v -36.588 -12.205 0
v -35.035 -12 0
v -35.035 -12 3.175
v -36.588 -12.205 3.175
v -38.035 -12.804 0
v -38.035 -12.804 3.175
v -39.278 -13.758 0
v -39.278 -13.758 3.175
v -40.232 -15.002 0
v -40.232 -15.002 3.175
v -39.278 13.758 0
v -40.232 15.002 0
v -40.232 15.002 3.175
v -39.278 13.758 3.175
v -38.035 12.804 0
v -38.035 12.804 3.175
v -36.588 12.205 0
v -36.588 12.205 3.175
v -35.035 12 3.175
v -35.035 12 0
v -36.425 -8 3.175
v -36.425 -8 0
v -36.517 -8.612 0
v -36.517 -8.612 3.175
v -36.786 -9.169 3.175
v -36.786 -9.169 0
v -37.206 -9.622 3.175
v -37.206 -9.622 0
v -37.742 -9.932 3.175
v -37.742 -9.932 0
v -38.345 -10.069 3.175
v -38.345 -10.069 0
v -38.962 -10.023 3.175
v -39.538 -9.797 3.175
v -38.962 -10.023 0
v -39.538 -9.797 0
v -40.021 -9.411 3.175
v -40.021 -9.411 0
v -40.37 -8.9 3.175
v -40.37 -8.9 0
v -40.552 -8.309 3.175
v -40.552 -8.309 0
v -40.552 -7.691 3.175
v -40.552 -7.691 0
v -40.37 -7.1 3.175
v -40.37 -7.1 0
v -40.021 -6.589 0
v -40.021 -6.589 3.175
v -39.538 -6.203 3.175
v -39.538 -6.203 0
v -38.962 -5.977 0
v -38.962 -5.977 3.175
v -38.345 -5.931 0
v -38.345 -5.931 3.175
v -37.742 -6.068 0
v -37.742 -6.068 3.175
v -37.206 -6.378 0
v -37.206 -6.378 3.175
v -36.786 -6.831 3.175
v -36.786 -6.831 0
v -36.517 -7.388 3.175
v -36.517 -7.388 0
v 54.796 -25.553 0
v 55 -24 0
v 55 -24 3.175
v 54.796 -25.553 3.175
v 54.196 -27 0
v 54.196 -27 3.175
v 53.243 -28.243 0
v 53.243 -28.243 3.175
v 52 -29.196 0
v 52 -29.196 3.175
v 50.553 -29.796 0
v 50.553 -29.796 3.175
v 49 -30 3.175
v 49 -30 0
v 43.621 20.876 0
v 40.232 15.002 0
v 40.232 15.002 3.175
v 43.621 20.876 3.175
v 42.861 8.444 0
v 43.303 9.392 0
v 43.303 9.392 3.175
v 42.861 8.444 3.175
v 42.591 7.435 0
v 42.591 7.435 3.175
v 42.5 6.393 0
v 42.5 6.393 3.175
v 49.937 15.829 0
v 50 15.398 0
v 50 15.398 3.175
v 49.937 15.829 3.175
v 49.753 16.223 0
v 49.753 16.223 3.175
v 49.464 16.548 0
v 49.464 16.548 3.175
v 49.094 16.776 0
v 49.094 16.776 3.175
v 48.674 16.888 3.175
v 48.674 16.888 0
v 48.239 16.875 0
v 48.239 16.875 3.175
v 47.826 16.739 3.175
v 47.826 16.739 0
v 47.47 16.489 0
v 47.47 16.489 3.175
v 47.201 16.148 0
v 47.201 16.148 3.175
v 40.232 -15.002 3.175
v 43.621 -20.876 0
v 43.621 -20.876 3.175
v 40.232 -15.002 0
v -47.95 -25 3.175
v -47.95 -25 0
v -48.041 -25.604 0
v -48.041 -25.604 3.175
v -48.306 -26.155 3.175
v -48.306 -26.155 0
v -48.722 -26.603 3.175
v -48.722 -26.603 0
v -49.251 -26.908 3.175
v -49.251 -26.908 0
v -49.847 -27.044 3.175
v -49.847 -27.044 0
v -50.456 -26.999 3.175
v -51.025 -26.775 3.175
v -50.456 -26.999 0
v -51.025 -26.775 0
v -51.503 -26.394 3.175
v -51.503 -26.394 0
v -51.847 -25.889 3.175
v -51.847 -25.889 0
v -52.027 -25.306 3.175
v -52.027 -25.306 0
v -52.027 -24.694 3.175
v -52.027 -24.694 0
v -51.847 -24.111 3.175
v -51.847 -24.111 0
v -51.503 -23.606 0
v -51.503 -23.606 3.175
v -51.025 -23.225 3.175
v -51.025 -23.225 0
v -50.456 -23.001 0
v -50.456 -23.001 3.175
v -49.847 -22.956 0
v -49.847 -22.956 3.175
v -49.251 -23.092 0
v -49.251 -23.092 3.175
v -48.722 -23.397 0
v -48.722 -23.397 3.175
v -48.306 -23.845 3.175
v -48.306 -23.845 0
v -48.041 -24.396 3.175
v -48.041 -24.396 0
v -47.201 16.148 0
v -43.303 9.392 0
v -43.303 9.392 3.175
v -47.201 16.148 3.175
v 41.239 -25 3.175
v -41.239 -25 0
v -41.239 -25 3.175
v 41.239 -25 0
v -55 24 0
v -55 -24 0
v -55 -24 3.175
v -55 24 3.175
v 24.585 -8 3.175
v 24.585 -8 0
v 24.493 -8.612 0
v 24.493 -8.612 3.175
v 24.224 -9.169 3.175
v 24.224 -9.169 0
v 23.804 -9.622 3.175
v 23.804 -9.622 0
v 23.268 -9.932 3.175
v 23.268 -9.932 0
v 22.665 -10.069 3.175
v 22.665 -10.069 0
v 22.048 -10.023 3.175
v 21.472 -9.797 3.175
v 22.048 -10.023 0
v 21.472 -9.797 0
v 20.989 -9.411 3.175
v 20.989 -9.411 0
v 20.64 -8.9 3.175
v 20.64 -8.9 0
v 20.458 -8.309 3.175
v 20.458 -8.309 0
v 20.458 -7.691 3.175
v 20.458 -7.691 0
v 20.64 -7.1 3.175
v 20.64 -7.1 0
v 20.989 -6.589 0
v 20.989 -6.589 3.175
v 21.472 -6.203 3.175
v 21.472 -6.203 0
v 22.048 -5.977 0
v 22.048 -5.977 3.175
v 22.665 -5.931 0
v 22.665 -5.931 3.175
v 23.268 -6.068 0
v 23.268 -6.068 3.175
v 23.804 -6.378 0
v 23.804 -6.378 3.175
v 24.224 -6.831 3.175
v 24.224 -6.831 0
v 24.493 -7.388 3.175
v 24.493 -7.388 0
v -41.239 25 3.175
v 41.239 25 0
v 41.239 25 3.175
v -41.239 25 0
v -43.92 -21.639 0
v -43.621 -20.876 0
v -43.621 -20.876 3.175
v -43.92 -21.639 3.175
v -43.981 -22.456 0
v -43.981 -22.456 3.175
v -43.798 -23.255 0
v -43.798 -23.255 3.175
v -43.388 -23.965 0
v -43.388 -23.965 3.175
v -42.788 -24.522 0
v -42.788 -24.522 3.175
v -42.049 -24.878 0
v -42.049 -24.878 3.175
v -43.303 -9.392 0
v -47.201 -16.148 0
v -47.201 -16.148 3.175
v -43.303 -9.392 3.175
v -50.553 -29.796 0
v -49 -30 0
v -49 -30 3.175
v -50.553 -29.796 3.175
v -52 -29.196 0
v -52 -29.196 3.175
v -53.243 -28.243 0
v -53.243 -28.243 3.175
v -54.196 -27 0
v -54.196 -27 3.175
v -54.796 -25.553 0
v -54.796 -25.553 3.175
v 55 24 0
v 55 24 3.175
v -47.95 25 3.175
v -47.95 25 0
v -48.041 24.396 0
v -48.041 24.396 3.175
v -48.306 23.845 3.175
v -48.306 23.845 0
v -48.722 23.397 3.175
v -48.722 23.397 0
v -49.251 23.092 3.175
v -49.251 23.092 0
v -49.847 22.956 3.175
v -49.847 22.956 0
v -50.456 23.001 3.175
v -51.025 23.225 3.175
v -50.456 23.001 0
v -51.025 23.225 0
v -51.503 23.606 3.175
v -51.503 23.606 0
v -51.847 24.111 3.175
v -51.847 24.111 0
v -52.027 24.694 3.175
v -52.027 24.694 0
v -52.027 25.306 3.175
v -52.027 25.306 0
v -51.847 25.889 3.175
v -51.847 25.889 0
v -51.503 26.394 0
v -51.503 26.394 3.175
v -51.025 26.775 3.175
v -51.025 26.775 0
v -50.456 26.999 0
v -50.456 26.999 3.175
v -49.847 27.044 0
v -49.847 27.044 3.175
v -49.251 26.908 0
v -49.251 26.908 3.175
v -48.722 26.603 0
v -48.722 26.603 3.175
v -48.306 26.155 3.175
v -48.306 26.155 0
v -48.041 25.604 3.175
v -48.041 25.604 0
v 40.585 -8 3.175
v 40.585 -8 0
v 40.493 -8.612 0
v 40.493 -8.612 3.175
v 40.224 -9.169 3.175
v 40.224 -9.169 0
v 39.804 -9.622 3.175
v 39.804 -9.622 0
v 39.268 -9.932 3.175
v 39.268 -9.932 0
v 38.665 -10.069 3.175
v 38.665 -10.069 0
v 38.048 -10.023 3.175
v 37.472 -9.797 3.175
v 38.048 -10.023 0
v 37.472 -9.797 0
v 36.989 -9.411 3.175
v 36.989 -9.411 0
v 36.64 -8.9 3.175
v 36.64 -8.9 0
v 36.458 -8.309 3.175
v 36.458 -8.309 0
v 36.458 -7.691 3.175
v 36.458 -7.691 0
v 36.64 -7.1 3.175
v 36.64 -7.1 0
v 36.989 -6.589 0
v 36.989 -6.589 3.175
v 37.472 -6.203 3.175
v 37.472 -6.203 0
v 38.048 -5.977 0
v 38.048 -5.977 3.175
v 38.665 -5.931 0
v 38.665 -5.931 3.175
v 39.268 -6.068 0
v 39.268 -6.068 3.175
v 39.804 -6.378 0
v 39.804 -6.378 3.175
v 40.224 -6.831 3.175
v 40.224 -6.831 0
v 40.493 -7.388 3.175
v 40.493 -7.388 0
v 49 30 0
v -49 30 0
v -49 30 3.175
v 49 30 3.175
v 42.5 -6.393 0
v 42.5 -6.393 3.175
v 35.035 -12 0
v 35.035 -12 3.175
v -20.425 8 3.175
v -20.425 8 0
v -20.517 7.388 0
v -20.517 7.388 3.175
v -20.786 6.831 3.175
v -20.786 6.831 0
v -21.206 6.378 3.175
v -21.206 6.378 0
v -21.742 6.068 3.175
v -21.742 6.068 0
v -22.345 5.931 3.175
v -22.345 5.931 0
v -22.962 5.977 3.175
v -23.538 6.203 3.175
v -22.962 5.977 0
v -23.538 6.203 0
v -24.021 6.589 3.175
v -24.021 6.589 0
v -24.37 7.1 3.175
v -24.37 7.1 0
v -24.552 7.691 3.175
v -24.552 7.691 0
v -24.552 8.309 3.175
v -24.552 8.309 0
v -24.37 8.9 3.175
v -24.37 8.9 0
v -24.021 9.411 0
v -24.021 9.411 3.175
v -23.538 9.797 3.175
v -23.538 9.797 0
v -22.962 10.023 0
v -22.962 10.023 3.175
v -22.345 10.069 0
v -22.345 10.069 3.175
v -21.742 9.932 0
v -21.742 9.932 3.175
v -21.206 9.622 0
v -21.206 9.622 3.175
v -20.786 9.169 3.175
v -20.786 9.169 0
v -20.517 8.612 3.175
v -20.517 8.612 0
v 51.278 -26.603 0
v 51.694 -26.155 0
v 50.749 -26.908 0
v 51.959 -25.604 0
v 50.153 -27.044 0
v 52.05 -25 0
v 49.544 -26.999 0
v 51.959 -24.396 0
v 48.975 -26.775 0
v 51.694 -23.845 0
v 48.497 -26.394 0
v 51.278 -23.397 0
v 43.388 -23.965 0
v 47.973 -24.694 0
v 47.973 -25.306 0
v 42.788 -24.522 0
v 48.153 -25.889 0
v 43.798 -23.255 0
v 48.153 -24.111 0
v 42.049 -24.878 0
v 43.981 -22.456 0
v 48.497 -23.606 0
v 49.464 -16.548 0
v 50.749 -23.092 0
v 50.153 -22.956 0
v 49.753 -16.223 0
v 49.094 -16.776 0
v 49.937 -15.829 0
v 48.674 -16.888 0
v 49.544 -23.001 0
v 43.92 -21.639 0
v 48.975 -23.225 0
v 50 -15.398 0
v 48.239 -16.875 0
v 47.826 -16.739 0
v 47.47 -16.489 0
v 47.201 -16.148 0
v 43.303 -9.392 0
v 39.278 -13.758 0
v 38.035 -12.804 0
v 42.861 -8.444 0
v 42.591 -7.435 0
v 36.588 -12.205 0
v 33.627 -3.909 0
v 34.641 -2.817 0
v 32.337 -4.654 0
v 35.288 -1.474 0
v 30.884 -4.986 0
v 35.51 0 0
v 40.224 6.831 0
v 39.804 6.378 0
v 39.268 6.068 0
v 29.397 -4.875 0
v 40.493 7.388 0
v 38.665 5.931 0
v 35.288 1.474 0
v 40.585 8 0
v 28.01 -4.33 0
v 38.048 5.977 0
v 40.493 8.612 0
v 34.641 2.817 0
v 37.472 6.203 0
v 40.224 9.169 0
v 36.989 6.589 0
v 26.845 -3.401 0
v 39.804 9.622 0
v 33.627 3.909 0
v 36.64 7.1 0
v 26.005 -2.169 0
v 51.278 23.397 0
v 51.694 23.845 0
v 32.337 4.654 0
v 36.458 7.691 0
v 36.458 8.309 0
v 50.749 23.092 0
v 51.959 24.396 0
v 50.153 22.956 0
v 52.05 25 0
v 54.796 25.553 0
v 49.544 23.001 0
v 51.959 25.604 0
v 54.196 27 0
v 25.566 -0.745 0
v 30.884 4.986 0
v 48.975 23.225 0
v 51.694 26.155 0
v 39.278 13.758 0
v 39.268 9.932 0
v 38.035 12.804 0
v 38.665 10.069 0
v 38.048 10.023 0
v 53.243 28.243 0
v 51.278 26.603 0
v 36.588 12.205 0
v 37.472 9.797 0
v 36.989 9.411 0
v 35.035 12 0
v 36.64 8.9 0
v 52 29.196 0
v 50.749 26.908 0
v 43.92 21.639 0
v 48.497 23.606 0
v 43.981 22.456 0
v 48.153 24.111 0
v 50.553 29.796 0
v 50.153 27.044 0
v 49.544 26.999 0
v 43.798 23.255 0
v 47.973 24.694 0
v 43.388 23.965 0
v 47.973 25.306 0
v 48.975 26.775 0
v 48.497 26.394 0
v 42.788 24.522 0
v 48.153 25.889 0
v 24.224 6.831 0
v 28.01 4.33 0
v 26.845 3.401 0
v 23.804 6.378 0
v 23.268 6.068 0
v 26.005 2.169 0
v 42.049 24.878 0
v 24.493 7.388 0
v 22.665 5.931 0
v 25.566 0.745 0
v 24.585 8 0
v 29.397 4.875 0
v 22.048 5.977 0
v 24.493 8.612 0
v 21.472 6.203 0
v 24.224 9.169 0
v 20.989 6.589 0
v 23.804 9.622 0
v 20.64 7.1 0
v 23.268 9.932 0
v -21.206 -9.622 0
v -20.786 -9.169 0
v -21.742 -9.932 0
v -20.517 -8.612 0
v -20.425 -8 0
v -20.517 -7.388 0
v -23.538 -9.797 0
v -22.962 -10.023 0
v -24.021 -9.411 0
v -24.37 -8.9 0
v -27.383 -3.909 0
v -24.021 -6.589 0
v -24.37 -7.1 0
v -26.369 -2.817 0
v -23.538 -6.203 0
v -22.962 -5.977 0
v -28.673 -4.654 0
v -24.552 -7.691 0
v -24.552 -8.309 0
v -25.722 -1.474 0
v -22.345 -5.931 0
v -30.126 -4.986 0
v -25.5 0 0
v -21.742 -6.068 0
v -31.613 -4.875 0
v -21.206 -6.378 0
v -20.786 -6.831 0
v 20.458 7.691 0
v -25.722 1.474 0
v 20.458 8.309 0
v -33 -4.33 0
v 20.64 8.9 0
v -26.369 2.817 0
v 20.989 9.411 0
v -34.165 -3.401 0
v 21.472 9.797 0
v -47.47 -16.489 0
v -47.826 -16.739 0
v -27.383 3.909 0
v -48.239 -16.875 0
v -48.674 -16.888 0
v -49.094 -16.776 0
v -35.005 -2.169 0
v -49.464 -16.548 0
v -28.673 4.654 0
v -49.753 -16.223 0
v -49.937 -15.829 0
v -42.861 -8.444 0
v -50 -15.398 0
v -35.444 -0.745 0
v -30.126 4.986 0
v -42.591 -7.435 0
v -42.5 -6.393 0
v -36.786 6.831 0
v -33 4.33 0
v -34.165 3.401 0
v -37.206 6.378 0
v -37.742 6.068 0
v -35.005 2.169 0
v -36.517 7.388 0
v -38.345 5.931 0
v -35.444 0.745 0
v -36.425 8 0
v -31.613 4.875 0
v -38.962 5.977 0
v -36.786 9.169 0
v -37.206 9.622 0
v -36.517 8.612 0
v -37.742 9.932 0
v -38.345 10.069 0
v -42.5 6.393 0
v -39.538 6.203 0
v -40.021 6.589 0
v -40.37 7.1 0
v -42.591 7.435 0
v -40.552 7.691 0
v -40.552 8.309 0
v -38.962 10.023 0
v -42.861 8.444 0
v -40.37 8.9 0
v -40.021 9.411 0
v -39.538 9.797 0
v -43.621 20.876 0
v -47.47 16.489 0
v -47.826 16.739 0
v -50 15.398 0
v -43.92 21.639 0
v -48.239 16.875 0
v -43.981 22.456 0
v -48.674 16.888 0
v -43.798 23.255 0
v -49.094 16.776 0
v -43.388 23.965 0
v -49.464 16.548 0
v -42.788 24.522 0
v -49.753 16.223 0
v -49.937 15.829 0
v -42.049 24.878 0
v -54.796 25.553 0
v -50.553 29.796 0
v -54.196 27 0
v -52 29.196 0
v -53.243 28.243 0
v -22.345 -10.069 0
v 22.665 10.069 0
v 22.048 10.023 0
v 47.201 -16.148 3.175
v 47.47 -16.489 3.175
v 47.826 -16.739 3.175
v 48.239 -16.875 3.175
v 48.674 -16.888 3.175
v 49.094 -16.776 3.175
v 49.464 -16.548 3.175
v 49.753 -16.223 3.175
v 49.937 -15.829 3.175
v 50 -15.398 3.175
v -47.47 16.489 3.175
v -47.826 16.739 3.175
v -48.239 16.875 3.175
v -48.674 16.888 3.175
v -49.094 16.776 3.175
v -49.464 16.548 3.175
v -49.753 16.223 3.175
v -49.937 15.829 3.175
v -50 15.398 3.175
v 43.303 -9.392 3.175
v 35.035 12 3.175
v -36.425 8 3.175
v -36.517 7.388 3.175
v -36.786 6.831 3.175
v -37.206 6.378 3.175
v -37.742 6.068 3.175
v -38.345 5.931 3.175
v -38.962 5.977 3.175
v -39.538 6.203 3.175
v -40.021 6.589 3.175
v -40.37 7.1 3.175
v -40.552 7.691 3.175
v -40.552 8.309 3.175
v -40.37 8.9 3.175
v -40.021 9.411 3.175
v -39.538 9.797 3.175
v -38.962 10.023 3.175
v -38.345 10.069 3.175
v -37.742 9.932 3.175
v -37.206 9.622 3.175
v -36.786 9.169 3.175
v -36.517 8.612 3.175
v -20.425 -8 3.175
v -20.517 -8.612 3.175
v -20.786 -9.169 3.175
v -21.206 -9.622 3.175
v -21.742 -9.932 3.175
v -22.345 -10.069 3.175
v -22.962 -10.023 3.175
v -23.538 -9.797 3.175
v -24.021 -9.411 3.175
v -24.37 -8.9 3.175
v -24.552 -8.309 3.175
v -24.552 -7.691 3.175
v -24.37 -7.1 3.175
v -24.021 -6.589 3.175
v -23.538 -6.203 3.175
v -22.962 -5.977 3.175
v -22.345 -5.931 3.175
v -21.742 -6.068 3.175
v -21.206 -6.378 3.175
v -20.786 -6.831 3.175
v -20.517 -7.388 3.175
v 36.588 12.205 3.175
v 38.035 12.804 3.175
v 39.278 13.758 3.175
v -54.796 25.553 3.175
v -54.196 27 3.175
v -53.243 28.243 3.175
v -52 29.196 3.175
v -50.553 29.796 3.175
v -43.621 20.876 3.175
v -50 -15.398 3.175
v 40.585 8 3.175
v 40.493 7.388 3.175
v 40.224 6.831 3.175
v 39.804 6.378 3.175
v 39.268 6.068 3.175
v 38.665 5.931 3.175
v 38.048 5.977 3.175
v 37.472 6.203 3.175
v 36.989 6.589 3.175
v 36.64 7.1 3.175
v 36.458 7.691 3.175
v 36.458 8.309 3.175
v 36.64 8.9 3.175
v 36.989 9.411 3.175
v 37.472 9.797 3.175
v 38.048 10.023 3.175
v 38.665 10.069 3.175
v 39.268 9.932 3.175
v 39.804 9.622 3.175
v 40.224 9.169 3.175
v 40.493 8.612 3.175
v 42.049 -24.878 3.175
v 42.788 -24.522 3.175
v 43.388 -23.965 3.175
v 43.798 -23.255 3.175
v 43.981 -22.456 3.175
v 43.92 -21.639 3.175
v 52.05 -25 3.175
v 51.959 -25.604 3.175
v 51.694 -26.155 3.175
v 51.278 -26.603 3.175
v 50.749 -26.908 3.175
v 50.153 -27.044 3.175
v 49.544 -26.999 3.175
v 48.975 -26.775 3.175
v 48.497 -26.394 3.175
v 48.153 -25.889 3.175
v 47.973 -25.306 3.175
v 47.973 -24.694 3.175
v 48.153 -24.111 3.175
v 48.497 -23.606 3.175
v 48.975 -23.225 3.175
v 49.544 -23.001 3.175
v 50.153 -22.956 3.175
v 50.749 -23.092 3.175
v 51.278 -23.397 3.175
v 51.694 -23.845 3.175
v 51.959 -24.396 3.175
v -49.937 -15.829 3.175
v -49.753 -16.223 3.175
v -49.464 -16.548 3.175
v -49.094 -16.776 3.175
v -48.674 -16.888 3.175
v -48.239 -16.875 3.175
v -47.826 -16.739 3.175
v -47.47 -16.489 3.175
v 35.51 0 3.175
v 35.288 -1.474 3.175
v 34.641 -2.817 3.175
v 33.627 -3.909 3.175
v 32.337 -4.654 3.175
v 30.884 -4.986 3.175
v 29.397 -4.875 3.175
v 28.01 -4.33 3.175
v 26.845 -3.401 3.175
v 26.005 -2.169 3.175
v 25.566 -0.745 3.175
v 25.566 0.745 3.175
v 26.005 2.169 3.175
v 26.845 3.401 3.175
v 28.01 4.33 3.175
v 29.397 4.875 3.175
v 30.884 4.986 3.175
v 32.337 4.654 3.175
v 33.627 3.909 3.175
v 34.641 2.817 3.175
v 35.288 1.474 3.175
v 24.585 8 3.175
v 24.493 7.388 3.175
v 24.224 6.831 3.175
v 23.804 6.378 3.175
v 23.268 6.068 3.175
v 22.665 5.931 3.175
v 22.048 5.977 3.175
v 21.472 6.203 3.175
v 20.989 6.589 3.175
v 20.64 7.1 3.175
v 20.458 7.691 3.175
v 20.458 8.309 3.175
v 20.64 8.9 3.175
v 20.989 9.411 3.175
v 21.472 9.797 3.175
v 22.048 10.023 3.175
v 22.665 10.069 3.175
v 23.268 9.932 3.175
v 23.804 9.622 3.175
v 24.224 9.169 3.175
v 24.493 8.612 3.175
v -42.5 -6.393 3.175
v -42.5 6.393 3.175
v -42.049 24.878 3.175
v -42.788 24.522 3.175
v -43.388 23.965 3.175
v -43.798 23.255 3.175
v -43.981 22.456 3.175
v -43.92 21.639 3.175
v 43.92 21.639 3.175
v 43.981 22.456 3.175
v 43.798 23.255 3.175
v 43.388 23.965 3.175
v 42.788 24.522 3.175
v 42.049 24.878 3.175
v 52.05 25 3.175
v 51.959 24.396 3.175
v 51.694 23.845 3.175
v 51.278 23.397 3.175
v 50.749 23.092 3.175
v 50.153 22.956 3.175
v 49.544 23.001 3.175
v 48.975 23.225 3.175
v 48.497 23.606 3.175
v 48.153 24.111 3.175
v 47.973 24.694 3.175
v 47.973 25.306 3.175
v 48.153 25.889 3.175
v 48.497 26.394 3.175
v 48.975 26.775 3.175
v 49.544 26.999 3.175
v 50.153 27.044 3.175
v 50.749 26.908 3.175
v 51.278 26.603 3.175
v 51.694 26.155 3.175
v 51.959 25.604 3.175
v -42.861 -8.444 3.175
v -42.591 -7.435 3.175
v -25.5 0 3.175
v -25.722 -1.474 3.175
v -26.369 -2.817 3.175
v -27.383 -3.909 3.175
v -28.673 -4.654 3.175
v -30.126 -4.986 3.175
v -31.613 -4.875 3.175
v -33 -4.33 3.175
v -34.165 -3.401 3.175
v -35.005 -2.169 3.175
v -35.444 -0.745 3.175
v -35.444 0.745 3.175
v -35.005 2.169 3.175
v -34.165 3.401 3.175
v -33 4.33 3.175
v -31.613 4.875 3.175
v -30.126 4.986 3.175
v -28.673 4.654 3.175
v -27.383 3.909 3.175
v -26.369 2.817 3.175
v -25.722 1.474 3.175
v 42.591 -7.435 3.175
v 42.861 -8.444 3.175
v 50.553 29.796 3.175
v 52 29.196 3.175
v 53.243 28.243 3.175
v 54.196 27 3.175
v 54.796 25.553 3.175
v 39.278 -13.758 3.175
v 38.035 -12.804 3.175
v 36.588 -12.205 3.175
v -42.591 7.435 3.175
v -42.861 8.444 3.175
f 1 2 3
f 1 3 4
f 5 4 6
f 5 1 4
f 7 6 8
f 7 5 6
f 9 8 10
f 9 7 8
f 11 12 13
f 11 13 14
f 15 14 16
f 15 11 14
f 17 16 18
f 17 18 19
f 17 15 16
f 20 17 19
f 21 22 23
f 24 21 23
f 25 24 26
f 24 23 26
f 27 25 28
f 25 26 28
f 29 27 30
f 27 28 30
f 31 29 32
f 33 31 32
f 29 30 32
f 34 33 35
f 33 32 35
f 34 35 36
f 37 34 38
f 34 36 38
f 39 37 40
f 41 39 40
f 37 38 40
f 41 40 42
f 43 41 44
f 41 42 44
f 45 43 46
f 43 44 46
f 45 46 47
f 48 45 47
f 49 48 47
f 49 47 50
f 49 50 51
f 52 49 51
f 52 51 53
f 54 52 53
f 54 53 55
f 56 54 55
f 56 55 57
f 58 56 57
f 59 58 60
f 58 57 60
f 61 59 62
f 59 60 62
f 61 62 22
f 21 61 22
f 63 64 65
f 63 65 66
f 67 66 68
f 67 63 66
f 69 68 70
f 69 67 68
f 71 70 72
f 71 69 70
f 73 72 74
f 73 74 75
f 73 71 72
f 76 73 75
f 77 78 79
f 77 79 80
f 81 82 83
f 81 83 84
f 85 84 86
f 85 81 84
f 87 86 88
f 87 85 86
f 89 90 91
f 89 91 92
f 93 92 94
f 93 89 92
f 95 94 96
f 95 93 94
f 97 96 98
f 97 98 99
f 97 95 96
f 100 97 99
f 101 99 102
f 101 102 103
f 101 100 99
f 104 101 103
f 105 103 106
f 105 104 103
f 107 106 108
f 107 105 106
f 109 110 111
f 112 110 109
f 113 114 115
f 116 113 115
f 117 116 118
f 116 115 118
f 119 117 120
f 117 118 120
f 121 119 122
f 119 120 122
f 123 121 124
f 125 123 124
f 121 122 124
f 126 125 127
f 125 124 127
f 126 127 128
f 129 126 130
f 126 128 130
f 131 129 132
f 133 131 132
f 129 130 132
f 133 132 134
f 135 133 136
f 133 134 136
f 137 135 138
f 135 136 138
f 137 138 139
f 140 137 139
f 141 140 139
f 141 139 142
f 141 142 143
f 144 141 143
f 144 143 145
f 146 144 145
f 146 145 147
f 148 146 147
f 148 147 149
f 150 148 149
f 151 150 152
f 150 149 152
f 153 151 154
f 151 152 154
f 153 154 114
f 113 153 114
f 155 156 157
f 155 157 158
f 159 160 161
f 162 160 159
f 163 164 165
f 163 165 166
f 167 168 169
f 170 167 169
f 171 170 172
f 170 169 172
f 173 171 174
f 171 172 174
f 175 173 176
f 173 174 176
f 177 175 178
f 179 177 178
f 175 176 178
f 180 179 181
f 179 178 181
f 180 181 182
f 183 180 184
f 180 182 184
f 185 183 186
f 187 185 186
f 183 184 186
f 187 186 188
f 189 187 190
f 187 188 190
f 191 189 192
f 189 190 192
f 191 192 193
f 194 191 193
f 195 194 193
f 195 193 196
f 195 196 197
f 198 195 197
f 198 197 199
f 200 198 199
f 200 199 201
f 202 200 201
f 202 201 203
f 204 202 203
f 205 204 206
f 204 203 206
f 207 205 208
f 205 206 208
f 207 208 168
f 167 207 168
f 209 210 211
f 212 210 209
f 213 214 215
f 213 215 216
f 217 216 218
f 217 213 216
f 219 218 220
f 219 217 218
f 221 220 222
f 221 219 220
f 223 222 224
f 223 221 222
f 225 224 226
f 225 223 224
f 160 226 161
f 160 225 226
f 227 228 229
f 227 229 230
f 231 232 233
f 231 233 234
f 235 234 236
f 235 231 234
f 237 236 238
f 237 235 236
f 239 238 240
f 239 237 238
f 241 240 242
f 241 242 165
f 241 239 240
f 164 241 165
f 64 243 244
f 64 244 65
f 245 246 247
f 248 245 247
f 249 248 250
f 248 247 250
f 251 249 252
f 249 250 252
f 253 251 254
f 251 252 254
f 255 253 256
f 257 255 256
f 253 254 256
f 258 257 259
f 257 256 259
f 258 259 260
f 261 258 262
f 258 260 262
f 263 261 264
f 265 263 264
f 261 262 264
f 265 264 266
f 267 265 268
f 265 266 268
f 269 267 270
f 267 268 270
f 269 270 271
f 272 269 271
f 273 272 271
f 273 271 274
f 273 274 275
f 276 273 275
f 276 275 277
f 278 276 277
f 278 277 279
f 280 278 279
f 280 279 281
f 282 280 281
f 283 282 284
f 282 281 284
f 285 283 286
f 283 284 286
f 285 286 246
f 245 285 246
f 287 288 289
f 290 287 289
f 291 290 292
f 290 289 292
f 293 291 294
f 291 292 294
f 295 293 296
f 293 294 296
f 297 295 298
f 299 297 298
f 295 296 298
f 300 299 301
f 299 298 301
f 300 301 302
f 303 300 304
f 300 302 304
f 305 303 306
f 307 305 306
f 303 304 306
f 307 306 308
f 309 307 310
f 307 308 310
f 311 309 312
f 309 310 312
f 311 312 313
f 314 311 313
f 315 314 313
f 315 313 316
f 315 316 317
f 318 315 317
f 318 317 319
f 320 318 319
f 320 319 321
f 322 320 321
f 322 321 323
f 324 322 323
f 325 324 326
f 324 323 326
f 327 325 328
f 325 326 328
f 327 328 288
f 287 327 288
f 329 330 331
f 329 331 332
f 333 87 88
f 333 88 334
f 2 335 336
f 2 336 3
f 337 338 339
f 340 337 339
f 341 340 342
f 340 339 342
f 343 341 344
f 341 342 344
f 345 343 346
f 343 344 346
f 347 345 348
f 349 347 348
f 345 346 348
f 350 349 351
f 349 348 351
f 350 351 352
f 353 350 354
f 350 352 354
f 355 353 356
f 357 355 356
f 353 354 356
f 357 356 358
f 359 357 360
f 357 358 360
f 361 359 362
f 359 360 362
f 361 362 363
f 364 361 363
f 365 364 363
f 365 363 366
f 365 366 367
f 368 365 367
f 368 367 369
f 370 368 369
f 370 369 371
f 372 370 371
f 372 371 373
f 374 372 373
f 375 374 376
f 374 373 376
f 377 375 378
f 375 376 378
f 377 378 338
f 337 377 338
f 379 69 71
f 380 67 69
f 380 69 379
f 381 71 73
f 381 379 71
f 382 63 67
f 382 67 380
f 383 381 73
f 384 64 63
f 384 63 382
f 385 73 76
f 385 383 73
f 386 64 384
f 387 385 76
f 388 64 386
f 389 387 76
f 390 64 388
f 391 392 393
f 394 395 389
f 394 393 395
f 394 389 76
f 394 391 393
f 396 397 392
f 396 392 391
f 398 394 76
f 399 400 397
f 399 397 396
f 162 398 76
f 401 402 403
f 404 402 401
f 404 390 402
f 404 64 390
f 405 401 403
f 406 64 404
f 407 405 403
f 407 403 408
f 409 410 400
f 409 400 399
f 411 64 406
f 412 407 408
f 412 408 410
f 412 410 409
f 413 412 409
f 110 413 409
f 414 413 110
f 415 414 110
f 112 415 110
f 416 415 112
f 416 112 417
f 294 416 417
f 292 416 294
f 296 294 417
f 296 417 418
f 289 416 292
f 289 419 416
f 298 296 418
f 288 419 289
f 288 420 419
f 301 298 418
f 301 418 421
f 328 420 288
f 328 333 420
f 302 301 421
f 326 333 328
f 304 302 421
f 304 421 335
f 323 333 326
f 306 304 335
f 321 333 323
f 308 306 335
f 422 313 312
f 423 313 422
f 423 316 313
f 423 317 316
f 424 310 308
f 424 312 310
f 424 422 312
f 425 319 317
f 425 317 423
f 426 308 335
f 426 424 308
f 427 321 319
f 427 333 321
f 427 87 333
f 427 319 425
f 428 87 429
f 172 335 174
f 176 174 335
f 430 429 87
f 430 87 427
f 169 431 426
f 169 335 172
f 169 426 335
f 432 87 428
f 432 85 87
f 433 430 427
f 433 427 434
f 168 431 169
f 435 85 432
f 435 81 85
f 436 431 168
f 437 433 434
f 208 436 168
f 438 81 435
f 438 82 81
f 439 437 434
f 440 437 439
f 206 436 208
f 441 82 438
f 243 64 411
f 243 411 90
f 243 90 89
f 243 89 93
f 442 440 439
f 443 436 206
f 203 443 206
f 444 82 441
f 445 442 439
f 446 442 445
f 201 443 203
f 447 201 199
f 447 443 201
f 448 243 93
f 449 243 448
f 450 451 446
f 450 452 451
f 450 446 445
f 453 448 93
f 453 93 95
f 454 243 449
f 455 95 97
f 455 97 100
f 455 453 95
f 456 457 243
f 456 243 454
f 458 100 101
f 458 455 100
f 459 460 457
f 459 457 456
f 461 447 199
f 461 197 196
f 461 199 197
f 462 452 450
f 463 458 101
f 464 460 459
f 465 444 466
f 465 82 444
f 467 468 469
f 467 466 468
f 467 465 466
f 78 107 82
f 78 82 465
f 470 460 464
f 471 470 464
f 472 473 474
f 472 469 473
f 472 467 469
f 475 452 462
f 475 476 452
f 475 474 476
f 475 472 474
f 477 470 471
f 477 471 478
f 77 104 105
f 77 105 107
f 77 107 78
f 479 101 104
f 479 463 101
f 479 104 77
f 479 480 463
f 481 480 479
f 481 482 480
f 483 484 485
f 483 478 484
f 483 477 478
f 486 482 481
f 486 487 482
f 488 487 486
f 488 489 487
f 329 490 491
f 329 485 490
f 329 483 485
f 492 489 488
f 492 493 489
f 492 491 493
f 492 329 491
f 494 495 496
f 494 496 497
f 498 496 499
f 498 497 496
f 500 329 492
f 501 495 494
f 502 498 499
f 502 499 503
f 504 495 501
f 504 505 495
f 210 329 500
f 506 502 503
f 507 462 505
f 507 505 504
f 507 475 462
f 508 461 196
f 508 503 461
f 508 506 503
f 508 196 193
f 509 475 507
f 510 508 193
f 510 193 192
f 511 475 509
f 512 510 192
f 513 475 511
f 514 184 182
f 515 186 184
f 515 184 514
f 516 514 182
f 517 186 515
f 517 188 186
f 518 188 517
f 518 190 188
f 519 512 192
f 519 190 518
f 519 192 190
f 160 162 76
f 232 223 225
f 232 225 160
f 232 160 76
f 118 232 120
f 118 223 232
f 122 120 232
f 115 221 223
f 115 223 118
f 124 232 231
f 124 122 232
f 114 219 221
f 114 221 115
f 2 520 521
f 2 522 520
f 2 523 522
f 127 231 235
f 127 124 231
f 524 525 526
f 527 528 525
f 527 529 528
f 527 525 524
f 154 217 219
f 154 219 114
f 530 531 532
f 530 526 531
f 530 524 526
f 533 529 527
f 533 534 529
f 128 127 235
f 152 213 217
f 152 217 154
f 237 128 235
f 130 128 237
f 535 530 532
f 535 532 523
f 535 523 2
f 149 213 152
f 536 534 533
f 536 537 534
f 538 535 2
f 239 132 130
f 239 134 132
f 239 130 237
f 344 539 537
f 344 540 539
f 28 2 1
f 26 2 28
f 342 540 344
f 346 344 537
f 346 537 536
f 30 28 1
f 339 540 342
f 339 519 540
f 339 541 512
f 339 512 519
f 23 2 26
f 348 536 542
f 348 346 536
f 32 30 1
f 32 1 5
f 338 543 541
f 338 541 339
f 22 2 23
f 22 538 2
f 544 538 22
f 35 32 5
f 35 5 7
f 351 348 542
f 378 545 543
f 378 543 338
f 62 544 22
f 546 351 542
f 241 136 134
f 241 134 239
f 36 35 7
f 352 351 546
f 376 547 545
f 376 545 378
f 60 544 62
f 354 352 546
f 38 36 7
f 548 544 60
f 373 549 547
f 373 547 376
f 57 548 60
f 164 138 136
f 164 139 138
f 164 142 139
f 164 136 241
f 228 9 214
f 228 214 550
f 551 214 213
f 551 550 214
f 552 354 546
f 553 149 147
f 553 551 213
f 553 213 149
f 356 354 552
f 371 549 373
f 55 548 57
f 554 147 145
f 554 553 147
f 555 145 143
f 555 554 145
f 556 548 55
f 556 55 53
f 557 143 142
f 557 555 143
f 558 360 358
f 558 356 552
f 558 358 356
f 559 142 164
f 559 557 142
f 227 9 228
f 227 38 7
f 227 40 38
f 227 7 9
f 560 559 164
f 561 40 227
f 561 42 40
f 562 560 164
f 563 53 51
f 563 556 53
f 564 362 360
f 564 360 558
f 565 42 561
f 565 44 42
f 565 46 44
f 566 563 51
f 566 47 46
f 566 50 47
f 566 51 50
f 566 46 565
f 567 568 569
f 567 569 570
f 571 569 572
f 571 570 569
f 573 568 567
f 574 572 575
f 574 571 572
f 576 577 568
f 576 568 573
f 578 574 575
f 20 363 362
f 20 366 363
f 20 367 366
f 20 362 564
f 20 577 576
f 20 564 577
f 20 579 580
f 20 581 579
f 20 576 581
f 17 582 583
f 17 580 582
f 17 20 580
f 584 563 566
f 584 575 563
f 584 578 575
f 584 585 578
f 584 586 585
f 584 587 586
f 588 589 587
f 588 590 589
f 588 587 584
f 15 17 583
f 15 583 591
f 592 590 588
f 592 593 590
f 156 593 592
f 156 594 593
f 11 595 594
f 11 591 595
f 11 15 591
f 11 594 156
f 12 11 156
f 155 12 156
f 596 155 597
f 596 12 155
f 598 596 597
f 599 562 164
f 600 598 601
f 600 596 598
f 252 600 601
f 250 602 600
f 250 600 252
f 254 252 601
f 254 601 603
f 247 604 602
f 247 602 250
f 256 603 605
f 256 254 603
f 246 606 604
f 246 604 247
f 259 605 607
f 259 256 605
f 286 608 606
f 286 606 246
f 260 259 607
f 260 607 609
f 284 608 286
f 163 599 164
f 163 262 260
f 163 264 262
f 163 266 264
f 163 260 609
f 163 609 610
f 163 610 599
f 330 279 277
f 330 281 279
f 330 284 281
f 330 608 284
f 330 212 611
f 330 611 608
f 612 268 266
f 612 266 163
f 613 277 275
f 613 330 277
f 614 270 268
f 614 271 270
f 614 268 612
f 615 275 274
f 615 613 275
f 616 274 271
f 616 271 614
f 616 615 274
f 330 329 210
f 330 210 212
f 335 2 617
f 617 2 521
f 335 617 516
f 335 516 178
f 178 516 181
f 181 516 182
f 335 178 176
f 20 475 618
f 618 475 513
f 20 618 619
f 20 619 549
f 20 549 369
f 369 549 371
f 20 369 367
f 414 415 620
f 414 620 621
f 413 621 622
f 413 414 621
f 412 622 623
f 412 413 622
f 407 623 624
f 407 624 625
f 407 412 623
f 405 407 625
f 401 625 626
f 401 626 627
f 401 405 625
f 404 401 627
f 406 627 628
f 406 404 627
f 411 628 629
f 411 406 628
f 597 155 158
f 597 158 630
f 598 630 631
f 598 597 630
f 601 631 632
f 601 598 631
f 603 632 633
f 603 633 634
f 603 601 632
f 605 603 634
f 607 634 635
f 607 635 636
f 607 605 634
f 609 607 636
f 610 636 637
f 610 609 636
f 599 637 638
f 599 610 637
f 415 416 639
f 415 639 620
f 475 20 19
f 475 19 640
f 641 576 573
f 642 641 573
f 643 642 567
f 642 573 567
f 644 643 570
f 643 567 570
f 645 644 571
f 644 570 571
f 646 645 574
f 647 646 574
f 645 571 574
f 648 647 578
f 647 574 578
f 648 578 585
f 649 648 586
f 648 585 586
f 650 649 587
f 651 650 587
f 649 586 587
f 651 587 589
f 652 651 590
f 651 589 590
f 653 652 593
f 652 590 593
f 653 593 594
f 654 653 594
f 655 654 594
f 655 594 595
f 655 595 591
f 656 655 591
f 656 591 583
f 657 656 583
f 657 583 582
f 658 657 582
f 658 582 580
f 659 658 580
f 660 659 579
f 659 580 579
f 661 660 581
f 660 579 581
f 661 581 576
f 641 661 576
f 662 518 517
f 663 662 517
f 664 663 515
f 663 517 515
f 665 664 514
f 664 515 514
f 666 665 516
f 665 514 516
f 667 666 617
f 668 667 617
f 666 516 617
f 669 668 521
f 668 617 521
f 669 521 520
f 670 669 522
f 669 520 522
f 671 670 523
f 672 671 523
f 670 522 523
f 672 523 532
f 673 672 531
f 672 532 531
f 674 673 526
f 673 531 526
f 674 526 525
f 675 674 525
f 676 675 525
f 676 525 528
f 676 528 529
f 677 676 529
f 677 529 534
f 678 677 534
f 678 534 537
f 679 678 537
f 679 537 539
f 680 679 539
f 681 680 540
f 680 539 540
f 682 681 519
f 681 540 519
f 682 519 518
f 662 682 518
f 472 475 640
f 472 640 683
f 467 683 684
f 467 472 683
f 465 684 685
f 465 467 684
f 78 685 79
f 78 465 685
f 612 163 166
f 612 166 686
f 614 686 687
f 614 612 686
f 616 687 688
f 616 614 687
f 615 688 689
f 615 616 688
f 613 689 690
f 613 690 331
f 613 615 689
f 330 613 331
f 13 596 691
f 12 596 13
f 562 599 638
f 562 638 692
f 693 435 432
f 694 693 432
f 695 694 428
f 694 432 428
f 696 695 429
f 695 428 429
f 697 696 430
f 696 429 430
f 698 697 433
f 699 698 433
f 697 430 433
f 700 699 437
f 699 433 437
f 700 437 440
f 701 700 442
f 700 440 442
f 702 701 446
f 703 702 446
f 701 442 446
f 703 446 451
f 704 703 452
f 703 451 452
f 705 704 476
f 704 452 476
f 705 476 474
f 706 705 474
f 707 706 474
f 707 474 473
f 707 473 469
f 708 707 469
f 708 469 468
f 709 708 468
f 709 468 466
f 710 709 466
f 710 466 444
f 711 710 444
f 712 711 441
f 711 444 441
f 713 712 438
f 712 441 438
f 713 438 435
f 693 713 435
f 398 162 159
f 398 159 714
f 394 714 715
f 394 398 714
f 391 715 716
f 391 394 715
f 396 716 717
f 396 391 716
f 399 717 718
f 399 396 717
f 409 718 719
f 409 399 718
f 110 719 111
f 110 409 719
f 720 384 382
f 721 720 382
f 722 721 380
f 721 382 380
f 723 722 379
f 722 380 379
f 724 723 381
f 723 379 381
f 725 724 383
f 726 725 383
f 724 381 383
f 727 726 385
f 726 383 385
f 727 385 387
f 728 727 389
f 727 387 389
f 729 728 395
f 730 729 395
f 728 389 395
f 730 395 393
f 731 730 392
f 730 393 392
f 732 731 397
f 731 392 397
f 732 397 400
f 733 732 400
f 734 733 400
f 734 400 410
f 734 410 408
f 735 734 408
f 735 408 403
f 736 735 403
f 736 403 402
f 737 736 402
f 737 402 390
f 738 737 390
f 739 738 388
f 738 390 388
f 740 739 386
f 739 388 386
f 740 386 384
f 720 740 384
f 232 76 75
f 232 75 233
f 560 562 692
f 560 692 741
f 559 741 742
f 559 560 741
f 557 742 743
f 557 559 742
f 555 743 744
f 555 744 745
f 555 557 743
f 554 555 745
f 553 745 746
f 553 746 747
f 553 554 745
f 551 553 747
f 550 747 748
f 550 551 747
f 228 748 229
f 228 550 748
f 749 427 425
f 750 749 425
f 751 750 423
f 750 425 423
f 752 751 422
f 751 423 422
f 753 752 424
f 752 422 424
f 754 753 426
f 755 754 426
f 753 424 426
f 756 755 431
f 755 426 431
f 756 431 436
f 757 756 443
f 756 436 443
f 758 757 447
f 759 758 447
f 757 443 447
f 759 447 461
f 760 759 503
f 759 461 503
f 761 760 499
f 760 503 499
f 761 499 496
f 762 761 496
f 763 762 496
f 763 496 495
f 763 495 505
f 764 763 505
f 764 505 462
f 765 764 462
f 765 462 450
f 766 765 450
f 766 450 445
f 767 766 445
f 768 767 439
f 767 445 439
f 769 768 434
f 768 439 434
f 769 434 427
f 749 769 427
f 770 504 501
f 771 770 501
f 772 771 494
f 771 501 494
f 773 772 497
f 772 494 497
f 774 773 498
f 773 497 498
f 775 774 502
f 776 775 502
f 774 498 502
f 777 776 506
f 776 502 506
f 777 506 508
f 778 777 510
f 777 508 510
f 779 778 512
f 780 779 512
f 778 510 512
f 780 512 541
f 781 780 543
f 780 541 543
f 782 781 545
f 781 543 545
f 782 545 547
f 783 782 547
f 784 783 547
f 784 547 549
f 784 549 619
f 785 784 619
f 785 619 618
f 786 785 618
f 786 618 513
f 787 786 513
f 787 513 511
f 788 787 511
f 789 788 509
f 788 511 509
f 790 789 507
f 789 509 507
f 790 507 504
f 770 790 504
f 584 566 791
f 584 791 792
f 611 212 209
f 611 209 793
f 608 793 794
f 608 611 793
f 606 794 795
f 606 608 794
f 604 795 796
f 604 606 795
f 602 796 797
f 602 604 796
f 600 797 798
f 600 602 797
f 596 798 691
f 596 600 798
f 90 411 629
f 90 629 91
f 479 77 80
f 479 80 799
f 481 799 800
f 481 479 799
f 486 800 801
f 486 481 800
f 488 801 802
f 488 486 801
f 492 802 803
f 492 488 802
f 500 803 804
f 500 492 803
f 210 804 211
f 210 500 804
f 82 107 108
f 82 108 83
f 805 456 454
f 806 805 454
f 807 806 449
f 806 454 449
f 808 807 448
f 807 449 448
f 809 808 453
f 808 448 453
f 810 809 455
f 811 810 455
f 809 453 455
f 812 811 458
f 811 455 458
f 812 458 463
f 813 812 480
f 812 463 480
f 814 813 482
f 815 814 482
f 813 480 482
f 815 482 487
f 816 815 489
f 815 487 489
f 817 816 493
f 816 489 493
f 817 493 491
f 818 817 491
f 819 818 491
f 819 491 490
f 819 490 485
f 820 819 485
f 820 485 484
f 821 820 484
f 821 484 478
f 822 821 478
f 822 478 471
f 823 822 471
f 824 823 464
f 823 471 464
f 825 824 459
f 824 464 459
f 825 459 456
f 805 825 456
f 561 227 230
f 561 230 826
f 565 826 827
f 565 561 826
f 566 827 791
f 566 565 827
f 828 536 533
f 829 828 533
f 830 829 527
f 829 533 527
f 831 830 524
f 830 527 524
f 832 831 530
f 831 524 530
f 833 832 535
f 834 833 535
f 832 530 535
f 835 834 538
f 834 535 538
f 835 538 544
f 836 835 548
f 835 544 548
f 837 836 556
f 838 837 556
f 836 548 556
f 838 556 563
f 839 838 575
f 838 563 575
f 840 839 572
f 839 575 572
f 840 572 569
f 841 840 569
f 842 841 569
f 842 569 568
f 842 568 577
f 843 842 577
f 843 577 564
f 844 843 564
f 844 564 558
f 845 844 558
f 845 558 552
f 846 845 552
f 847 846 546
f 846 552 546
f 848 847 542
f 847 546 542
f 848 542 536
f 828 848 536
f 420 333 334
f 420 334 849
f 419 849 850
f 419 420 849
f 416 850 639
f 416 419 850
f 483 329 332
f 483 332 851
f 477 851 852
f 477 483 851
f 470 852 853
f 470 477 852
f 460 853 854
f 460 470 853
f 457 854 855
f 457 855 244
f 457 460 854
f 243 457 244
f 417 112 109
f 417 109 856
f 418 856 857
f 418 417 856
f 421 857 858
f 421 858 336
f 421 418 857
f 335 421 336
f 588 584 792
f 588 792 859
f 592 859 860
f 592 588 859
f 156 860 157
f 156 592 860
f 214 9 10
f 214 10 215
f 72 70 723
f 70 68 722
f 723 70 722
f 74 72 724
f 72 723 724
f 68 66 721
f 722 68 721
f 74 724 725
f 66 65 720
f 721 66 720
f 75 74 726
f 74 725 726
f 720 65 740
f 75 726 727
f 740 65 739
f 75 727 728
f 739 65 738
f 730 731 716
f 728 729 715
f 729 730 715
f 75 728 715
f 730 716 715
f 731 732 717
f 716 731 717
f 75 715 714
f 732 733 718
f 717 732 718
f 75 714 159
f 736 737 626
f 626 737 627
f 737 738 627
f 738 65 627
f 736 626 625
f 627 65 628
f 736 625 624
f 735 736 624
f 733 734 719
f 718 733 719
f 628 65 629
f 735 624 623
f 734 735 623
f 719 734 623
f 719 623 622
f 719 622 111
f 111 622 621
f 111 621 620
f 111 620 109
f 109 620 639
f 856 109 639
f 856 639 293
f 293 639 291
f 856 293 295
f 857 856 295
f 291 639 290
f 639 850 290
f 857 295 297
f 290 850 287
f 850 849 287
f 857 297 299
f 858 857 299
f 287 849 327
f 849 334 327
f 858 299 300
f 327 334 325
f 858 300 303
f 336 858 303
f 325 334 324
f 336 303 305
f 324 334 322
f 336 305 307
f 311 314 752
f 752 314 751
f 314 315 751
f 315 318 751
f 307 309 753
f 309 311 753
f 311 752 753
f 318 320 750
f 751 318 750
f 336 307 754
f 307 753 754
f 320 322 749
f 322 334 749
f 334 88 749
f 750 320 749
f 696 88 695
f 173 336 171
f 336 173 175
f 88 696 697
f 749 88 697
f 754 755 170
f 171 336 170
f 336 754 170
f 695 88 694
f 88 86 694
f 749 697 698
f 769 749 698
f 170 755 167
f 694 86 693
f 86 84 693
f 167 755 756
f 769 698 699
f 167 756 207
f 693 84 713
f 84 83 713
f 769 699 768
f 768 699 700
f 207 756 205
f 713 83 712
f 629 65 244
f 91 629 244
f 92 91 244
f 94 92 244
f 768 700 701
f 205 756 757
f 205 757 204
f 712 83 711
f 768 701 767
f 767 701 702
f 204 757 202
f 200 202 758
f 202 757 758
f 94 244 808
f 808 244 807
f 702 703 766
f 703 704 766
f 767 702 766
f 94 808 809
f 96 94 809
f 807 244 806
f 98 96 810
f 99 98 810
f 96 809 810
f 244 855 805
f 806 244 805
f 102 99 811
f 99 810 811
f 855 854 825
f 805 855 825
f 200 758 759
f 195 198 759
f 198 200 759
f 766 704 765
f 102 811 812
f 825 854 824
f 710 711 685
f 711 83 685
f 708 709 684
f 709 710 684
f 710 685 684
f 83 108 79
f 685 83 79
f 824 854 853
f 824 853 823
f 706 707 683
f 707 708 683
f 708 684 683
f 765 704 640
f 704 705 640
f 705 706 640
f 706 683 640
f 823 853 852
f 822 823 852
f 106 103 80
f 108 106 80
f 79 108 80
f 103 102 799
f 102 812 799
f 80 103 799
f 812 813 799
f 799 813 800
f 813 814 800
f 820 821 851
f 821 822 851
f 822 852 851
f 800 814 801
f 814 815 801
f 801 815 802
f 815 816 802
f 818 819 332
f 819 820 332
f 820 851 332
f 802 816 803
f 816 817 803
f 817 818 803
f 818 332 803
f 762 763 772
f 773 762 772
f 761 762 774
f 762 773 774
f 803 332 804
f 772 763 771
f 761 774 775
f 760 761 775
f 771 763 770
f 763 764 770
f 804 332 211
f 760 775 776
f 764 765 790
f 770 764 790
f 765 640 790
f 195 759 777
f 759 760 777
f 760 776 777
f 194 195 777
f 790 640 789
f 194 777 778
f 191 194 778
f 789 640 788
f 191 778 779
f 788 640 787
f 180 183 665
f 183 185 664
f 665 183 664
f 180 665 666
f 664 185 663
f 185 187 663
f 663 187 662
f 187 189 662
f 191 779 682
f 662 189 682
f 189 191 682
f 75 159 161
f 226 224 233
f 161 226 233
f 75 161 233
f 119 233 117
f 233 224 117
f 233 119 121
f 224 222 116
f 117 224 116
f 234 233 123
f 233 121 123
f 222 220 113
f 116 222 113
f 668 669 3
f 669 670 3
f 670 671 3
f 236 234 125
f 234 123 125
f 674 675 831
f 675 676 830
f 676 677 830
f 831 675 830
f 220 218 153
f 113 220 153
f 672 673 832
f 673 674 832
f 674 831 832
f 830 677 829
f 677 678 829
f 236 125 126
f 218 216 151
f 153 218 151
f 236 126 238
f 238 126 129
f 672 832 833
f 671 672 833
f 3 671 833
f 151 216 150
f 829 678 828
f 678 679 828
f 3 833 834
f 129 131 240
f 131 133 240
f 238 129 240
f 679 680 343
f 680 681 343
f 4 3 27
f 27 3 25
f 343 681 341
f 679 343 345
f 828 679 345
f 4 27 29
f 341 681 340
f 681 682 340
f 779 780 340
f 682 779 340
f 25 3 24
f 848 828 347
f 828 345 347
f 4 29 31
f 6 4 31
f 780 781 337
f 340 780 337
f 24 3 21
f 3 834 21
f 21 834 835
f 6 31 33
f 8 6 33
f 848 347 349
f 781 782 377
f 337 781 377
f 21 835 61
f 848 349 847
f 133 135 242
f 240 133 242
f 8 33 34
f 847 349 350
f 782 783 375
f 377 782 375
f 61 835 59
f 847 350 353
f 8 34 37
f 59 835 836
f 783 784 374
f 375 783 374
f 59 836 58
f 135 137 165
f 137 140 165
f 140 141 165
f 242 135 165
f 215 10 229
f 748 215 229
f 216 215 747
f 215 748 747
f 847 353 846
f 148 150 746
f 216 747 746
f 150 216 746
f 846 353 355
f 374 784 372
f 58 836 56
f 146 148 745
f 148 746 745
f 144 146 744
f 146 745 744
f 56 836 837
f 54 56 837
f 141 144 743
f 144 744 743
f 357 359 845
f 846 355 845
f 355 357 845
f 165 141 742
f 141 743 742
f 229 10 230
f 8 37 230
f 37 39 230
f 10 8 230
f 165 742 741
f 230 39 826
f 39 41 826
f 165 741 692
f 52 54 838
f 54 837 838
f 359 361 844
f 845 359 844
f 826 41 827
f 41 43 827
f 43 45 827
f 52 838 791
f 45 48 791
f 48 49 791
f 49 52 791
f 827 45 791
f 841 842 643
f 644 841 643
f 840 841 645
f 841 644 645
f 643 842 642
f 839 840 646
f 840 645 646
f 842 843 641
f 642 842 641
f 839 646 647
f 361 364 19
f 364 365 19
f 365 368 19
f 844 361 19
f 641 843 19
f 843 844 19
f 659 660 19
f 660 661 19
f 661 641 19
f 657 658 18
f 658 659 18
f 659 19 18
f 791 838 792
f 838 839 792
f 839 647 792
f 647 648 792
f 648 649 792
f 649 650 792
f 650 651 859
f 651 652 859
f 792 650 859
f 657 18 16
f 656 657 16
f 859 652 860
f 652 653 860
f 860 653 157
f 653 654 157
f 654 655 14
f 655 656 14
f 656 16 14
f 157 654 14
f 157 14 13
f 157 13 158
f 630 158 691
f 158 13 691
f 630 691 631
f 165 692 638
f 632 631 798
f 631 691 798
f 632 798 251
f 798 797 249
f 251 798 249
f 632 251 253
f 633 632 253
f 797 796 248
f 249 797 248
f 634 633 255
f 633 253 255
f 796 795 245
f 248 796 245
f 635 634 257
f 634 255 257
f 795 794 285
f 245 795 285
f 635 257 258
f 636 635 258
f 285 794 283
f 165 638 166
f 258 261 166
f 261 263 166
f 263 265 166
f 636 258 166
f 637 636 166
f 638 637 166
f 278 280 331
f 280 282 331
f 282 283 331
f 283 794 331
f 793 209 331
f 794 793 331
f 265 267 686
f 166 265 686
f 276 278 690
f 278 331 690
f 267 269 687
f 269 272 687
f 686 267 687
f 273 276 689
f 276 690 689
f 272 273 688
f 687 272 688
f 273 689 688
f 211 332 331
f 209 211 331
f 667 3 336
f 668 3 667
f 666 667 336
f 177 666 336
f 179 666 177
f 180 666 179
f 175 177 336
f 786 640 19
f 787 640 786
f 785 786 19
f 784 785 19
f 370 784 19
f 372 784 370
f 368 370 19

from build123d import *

# Parameters (mm, degrees)
SKETCH1_R           = 5
SKETCH1_R_2         = 2.075
SKETCH1_R_3         = 2.05
BOSS_EXTRUDE1_DEPTH = 3.175


with BuildPart() as part:
    # Sketch1 → Boss-Extrude1 (new body)
    with BuildSketch(Plane(origin=(0, 0, 0), x_dir=(-1, 0, 0), z_dir=(0, 0, -1))):
        with BuildLine():
            Line((49, 30), (-49, 30))
            ThreePointArc((-49, 30), (-53.242640687, 28.242640687), (-55, 24))
            Line((-55, 24), (-55, -24))
            ThreePointArc((-55, -24), (-53.242640687, -28.242640687), (-49, -30))
            Line((-49, -30), (49, -30))
            ThreePointArc((49, -30), (53.242640687, -28.242640687), (55, -24))
            Line((55, -24), (55, 24))
            ThreePointArc((55, 24), (53.242640687, 28.242640687), (49, 30))
        make_face()
        with Locations(Location((-30.51, 0, 0), (0, 0, 180))):
            Circle(SKETCH1_R, mode=Mode.SUBTRACT)
        with Locations(Location((30.5, 0, 0), (0, 0, 180))):
            Circle(SKETCH1_R, mode=Mode.SUBTRACT)
        with Locations(Location((-22.51, -8, 0), (0, 0, 180))):
            Circle(SKETCH1_R_2, mode=Mode.SUBTRACT)
        with Locations(Location((-38.51, -8, 0), (0, 0, 180))):
            Circle(SKETCH1_R_2, mode=Mode.SUBTRACT)
        with Locations(Location((-38.51, 8, 0), (0, 0, 180))):
            Circle(SKETCH1_R_2, mode=Mode.SUBTRACT)
        with Locations(Location((-22.51, 8, 0), (0, 0, 180))):
            Circle(SKETCH1_R_2, mode=Mode.SUBTRACT)
        with Locations(Location((38.5, -8, 0), (0, 0, 180))):
            Circle(SKETCH1_R_2, mode=Mode.SUBTRACT)
        with Locations(Location((22.5, -8, 0), (0, 0, 180))):
            Circle(SKETCH1_R_2, mode=Mode.SUBTRACT)
        with Locations(Location((22.5, 8, 0), (0, 0, 180))):
            Circle(SKETCH1_R_2, mode=Mode.SUBTRACT)
        with Locations(Location((38.5, 8, 0), (0, 0, 180))):
            Circle(SKETCH1_R_2, mode=Mode.SUBTRACT)
        with Locations(Location((50, -25, 0), (0, 0, 180))):
            Circle(SKETCH1_R_3, mode=Mode.SUBTRACT)
        with Locations(Location((-50, -25, 0), (0, 0, 180))):
            Circle(SKETCH1_R_3, mode=Mode.SUBTRACT)
        with Locations(Location((-50, 25, 0), (0, 0, 180))):
            Circle(SKETCH1_R_3, mode=Mode.SUBTRACT)
        with Locations(Location((50, 25, 0), (0, 0, 180))):
            Circle(SKETCH1_R_3, mode=Mode.SUBTRACT)
        with BuildLine():
            Line((-42.5, 6.393335184), (-42.5, -6.393335184))
            ThreePointArc((-42.5, -6.393335184), (-42.704196298, -7.945320832), (-43.302886484, -9.391669905))
            Line((-43.302886484, -9.391669905), (-47.200721621, -16.147917476))
            ThreePointArc((-47.200721621, -16.147917476), (-48.887996412, -16.847284721), (-50, -15.398333796))
            Line((-50, -15.398333796), (-50, 15.398333796))
            ThreePointArc((-50, 15.398333796), (-48.887996412, 16.847284721), (-47.200721621, 16.147917476))
            Line((-47.200721621, 16.147917476), (-43.302886484, 9.391669905))
            ThreePointArc((-43.302886484, 9.391669905), (-42.704196298, 7.945320832), (-42.5, 6.393335184))
        make_face(mode=Mode.SUBTRACT)
        with BuildLine():
            Line((-35.034616452, -12), (35.034616452, -12))
            ThreePointArc((35.034616452, -12), (38.035448976, -12.804328324), (40.231729969, -15.001665279))
            Line((40.231729969, -15.001665279), (43.620632646, -20.875763253))
            ThreePointArc((43.620632646, -20.875763253), (43.619971802, -23.625381574), (41.238622284, -25))
            Line((41.238622284, -25), (-41.238622284, -25))
            ThreePointArc((-41.238622284, -25), (-43.619971802, -23.625381574), (-43.620632646, -20.875763253))
            Line((-43.620632646, -20.875763253), (-40.231729969, -15.001665279))
            ThreePointArc((-40.231729969, -15.001665279), (-38.035448976, -12.804328324), (-35.034616452, -12))
        make_face(mode=Mode.SUBTRACT)
        with BuildLine():
            Line((42.5, -6.393335184), (42.5, 6.393335184))
            ThreePointArc((42.5, 6.393335184), (42.704196298, 7.945320832), (43.302886484, 9.391669905))
            Line((43.302886484, 9.391669905), (47.200721621, 16.147917476))
            ThreePointArc((47.200721621, 16.147917476), (48.887996412, 16.847284721), (50, 15.398333796))
            Line((50, 15.398333796), (50, -15.398333796))
            ThreePointArc((50, -15.398333796), (48.887996412, -16.847284721), (47.200721621, -16.147917476))
            Line((47.200721621, -16.147917476), (43.302886484, -9.391669905))
            ThreePointArc((43.302886484, -9.391669905), (42.704196298, -7.945320832), (42.5, -6.393335184))
        make_face(mode=Mode.SUBTRACT)
        with BuildLine():
            Line((35.034616452, 12), (-35.034616452, 12))
            ThreePointArc((-35.034616452, 12), (-38.035448976, 12.804328324), (-40.231729969, 15.001665279))
            Line((-40.231729969, 15.001665279), (-43.620632646, 20.875763253))
            ThreePointArc((-43.620632646, 20.875763253), (-43.619971802, 23.625381574), (-41.238622284, 25))
            Line((-41.238622284, 25), (41.238622284, 25))
            ThreePointArc((41.238622284, 25), (43.619971802, 23.625381574), (43.620632646, 20.875763253))
            Line((43.620632646, 20.875763253), (40.231729969, 15.001665279))
            ThreePointArc((40.231729969, 15.001665279), (38.035448976, 12.804328324), (35.034616452, 12))
        make_face(mode=Mode.SUBTRACT)
    extrude(amount=-BOSS_EXTRUDE1_DEPTH)


solid = part.part
